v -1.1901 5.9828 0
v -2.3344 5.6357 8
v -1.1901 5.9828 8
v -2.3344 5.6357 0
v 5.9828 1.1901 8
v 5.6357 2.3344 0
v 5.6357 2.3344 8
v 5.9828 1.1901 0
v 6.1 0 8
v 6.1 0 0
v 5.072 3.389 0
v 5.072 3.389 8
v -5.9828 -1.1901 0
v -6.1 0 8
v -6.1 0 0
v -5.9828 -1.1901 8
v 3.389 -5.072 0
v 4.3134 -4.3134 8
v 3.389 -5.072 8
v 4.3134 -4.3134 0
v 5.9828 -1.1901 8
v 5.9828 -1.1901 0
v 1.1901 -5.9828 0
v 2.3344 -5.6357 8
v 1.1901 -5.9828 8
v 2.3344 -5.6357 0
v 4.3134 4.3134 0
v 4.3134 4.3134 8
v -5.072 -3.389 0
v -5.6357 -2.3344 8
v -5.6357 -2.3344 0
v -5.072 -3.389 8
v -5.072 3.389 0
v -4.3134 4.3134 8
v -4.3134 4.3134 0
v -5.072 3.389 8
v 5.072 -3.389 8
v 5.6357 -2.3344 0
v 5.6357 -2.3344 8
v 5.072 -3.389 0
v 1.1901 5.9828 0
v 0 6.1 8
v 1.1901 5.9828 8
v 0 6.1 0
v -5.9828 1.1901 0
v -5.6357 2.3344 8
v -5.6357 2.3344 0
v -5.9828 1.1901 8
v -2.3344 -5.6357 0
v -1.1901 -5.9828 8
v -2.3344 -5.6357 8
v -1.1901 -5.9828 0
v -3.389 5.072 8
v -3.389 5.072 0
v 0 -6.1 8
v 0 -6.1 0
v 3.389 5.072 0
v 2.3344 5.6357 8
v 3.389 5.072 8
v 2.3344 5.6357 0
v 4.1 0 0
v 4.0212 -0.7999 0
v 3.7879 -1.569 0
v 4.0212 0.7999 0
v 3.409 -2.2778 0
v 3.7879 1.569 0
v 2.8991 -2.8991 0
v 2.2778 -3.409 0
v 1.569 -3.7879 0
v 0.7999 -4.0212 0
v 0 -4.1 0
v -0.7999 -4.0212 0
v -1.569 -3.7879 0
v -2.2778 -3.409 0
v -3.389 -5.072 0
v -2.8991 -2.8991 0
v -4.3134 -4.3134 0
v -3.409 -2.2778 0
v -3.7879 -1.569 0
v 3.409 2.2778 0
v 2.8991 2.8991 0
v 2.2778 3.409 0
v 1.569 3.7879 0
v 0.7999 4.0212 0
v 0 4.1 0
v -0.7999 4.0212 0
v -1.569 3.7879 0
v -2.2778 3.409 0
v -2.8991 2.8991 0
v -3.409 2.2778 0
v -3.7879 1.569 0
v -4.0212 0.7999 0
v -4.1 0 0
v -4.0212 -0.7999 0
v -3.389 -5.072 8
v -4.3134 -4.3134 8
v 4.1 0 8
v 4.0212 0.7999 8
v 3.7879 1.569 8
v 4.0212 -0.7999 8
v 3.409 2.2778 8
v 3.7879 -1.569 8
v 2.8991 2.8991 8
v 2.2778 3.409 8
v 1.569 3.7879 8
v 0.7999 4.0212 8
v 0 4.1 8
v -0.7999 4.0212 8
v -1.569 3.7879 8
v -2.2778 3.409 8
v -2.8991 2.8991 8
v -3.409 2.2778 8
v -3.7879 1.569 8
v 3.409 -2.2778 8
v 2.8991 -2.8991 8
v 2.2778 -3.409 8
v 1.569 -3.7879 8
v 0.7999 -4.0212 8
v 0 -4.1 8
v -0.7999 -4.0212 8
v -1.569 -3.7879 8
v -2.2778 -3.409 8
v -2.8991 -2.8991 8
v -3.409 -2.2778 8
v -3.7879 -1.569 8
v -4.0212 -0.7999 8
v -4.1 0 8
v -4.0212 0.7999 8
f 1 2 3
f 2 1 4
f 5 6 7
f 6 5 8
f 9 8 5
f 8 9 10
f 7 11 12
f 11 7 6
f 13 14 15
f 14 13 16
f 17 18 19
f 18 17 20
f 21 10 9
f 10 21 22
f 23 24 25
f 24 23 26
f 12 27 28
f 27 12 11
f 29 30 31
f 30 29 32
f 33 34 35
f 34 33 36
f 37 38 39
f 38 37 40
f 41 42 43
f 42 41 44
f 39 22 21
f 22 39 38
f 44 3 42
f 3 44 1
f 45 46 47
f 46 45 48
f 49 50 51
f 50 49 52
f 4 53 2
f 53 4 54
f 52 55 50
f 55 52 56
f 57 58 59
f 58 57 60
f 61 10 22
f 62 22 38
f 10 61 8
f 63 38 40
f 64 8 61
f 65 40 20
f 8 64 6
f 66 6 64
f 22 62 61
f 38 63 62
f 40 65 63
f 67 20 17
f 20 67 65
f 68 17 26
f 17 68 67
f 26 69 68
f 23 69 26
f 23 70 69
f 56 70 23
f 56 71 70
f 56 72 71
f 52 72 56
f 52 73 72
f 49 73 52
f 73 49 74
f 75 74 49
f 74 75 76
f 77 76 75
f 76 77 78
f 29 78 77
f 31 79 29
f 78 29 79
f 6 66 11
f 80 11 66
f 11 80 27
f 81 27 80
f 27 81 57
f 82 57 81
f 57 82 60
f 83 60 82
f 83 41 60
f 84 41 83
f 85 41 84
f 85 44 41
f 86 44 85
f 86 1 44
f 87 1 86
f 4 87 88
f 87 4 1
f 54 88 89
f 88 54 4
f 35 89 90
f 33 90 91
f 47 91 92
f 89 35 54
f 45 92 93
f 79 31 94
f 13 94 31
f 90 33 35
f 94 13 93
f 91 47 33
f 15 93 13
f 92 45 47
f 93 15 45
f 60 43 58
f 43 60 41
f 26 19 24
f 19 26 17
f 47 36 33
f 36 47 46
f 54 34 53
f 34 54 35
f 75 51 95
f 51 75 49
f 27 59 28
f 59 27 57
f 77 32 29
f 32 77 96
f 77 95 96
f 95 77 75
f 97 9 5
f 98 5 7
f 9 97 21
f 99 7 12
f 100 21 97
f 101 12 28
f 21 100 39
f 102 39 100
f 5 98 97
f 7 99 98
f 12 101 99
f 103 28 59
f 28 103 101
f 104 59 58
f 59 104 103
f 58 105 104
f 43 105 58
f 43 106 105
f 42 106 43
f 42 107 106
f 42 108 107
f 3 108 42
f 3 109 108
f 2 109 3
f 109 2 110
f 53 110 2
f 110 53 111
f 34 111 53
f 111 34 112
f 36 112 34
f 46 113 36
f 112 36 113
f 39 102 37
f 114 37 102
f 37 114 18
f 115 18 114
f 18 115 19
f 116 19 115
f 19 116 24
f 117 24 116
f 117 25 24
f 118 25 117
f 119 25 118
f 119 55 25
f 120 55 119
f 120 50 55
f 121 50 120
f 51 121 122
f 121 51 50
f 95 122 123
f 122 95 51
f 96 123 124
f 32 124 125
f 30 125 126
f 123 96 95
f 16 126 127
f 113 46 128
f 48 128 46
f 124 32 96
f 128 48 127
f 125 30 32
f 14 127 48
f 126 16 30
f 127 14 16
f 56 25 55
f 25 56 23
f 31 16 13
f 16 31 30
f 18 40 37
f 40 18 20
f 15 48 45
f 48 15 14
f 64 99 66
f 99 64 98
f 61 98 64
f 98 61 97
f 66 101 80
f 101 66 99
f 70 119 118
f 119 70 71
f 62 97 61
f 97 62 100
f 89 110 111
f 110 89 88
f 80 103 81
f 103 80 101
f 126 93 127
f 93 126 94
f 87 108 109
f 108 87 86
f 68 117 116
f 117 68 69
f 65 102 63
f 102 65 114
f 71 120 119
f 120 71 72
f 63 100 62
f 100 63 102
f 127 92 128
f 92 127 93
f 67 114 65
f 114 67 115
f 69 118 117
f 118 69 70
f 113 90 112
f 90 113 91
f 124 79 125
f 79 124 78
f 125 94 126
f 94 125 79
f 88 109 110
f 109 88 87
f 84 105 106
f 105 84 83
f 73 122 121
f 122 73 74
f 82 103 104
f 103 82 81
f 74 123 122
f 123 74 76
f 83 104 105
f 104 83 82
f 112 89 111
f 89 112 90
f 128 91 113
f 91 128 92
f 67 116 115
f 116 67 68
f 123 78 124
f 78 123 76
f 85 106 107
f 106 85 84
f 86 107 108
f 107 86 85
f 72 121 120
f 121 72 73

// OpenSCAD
$fn = 32;

// ----------------------------------------------------------------------
// Spacer sleeve: 12.2 / 8.2 x 8 mm
// ----------------------------------------------------------------------

// --- parameters (mm) ---
sleeve_od = 12.2;         // outside diameter
sleeve_id = 8.2;          // shaft bore
sleeve_l = 8;             // sleeve length
step_d = 11.4;            // reduced diameter
step_l = 2.8;             // length of the step

module sleeve() {
  cylinder(h = sleeve_l, d = sleeve_od);
  translate([0, 0, sleeve_l - step_l]) cylinder(h = step_l, d = step_d);
}

difference() {
  sleeve();
  translate([0, 0, -1]) cylinder(h = sleeve_l + 2, d = sleeve_id);
}
